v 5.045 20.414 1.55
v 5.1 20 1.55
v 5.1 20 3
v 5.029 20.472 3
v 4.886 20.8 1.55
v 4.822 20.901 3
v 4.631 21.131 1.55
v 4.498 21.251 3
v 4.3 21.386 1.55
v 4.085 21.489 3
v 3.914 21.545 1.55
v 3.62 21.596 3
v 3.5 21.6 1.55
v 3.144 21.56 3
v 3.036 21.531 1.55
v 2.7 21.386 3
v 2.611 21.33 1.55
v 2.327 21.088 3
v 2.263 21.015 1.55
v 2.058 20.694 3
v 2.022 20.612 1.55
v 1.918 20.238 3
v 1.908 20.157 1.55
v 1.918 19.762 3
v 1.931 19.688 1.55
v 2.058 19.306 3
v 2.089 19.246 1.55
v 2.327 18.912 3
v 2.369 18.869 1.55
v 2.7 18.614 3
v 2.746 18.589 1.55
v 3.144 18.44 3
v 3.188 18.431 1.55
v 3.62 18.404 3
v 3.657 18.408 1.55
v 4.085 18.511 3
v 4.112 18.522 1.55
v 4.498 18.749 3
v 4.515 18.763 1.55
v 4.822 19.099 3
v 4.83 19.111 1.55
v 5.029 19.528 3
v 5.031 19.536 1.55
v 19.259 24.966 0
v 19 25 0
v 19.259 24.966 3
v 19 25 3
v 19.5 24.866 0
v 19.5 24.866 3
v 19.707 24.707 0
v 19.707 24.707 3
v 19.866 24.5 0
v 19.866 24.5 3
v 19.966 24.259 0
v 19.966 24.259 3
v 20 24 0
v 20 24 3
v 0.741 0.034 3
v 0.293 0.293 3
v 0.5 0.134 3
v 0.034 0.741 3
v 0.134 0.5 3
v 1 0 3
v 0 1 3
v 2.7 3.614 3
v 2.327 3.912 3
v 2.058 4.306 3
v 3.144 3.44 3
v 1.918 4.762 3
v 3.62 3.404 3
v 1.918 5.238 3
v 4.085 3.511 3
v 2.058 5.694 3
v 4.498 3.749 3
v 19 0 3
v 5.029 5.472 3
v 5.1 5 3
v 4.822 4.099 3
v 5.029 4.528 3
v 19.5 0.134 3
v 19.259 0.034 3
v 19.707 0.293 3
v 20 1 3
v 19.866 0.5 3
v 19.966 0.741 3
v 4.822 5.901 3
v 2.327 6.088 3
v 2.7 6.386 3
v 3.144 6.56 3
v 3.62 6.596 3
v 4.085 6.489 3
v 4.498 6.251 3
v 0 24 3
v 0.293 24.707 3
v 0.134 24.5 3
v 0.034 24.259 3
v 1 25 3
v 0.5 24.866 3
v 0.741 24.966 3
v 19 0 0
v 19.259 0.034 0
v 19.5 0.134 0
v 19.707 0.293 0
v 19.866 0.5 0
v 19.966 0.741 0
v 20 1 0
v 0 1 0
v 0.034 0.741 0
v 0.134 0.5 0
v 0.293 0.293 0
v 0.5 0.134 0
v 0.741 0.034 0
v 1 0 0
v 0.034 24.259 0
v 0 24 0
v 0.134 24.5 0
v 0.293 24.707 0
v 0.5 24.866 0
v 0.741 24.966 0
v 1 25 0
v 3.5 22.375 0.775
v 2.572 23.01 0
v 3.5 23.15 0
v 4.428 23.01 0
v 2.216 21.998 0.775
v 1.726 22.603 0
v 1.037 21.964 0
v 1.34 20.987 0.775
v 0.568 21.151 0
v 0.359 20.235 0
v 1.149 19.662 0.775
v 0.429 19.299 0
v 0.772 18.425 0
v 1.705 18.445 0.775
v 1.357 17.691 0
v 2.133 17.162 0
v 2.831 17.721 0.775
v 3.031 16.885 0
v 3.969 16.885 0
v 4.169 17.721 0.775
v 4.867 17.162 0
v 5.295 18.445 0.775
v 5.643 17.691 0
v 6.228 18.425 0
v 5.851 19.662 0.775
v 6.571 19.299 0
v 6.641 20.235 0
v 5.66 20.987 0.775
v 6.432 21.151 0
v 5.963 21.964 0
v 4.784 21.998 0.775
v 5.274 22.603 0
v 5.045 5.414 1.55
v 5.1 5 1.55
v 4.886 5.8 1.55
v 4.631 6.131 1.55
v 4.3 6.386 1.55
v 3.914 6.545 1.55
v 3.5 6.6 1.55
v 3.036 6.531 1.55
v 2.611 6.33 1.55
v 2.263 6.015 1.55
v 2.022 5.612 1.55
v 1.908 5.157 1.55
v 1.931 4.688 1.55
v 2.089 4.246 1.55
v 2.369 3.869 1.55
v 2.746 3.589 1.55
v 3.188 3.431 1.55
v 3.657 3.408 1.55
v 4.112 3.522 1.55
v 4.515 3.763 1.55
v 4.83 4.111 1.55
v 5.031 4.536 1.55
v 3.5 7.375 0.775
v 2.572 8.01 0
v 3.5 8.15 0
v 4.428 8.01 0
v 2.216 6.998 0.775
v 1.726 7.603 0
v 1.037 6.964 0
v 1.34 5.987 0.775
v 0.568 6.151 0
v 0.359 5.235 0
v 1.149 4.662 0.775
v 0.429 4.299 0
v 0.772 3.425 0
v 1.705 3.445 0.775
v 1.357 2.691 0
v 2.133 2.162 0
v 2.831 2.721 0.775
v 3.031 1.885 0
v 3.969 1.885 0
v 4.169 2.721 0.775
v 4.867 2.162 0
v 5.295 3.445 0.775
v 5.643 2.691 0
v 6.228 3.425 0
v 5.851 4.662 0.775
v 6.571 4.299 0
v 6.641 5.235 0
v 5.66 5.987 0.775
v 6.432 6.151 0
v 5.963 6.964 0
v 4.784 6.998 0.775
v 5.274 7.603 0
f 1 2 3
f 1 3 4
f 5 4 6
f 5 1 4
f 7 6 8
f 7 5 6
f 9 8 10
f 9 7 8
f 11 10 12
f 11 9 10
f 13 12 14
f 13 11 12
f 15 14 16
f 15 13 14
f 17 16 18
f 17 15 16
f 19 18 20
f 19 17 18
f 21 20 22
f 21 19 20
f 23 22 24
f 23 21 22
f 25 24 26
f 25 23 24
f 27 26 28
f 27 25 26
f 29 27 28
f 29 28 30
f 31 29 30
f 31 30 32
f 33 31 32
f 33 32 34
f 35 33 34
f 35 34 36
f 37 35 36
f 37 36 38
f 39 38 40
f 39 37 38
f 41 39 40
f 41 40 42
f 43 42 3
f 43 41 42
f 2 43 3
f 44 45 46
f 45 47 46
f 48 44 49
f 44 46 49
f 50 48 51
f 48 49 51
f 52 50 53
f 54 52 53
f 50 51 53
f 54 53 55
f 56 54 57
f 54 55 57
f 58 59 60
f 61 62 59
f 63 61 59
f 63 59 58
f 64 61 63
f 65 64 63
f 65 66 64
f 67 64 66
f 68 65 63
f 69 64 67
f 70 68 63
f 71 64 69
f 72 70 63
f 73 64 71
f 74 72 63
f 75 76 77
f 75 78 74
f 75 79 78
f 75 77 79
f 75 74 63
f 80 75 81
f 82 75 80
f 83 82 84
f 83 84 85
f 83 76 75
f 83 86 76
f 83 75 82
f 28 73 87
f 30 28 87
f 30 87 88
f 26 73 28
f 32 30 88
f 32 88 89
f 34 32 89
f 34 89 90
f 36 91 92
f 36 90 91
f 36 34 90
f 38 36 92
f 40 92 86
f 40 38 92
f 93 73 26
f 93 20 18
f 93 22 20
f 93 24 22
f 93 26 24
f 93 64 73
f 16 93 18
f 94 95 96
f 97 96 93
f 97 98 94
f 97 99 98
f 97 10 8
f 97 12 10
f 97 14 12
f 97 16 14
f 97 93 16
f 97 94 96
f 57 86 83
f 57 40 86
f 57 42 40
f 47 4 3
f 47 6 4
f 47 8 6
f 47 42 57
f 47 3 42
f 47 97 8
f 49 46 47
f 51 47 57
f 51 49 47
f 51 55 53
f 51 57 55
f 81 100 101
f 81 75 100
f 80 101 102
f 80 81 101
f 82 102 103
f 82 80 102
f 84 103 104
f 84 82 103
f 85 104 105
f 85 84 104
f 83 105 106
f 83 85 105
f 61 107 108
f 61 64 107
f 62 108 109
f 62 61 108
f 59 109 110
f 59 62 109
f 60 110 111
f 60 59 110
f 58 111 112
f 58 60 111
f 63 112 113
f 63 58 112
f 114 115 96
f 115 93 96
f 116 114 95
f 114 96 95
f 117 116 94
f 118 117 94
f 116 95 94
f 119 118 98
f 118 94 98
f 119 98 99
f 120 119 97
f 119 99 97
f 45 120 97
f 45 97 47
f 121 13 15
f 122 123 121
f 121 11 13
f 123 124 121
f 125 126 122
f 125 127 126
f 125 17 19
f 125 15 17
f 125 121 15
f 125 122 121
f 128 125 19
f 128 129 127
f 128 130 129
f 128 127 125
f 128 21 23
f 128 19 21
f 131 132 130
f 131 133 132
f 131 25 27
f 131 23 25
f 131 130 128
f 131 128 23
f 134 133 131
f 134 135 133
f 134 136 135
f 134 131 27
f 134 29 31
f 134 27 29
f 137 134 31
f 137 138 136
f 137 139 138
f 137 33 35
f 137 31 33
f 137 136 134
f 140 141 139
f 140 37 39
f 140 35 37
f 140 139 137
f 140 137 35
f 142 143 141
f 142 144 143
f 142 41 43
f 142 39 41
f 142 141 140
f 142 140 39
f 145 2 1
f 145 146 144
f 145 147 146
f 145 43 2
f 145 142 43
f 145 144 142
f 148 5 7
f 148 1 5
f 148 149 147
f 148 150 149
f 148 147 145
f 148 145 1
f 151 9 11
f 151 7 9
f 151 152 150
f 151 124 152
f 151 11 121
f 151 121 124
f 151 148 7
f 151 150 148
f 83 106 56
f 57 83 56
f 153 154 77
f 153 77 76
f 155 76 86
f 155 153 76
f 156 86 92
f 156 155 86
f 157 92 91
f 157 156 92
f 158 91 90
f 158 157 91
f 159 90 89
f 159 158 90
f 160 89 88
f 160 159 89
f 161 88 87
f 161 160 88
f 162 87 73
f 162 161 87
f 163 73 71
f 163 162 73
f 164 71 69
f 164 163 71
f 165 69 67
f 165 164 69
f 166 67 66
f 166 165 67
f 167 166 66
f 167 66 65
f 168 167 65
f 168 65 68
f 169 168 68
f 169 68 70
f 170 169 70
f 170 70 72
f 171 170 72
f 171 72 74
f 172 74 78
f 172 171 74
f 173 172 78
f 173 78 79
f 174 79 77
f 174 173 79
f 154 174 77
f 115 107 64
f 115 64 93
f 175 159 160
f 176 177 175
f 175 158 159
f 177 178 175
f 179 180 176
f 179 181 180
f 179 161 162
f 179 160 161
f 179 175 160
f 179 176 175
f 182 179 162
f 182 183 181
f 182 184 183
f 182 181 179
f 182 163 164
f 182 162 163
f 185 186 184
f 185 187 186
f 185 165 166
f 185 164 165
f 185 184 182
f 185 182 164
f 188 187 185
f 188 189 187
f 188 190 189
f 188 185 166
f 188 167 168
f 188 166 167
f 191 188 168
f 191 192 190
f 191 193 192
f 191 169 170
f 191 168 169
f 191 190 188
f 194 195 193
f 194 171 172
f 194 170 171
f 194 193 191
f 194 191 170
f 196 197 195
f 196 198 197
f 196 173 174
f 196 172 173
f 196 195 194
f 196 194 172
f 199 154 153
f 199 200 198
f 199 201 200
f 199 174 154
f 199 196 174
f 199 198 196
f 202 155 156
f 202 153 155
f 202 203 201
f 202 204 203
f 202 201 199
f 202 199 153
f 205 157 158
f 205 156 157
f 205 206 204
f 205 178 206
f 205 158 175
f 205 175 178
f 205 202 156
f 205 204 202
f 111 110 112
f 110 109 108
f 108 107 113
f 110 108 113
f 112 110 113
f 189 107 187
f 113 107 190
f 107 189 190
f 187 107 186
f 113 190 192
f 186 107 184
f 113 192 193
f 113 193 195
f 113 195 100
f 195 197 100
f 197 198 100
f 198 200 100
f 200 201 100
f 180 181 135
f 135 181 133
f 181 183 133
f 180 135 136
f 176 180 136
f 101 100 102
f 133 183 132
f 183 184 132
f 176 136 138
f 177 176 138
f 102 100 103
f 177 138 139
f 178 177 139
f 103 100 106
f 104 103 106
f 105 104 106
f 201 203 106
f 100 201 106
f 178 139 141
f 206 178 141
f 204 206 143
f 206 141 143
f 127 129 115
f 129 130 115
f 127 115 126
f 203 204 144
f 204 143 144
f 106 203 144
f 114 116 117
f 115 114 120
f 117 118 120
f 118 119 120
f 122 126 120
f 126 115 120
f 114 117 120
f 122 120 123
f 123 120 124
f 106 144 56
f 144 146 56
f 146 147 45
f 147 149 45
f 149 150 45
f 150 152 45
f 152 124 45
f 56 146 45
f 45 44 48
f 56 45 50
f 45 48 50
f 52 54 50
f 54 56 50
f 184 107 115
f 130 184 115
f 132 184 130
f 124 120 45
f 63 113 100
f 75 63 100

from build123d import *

# Parameters (mm, degrees)
SKETCH_1_W                  = 20
SKETCH_1_H                  = 25
SKETCH_1_R                  = 1.6
EXTRUDE_1_DEPTH             = 3
FILLET_1_R                  = 1
HOLE_WIZARD_M3_1_AT_2_COUNT = 2
HOLE_WIZARD_M3_1_AT_2_PITCH = 15


with BuildPart() as part:
    # ｽｹｯﾁ1 → ﾎﾞｽ - 押し出し1 (new body)
    with BuildSketch(Plane.XY):
        with Locations((10, 12.5)):
            Rectangle(SKETCH_1_W, SKETCH_1_H)
        with Locations((3.5, 5)):
            Circle(SKETCH_1_R, mode=Mode.SUBTRACT)
        with Locations((3.5, 20)):
            Circle(SKETCH_1_R, mode=Mode.SUBTRACT)
    extrude(amount=EXTRUDE_1_DEPTH)

    # ﾌｨﾚｯﾄ1
    fillet_1_edges = [part.edges().sort_by_distance(p)[0] for p in [
        (0, 25, 1.5),
        (20, 25, 1.5),
        (20, 0, 1.5),
        (0, 0, 1.5),
    ]]
    fillet(fillet_1_edges, radius=FILLET_1_R)

    # ｽｹｯﾁ3 → M3 丸皿ねじ用皿穴1 (revolve, cut)
    with BuildSketch(Plane(origin=(3.5, 20, 0), x_dir=(0, 1, 0), z_dir=(1, 0, 0))):
        Polygon((0, 0), (0, 3), (1.55, 3), (1.55, 1.6), (3.15, 0), align=None)
    hole_wizard_m3_1 = revolve(axis=Axis((3.5, 20, -6.35), (0, 0, 1)), mode=Mode.SUBTRACT)

    # M3 丸皿ねじ用皿穴1 at 2: M3 丸皿ねじ用皿穴1 ×2
    with Locations(*[(0, -i * HOLE_WIZARD_M3_1_AT_2_PITCH, 0) for i in range(1, HOLE_WIZARD_M3_1_AT_2_COUNT)]):
        add(hole_wizard_m3_1, mode=Mode.SUBTRACT)


solid = part.part
